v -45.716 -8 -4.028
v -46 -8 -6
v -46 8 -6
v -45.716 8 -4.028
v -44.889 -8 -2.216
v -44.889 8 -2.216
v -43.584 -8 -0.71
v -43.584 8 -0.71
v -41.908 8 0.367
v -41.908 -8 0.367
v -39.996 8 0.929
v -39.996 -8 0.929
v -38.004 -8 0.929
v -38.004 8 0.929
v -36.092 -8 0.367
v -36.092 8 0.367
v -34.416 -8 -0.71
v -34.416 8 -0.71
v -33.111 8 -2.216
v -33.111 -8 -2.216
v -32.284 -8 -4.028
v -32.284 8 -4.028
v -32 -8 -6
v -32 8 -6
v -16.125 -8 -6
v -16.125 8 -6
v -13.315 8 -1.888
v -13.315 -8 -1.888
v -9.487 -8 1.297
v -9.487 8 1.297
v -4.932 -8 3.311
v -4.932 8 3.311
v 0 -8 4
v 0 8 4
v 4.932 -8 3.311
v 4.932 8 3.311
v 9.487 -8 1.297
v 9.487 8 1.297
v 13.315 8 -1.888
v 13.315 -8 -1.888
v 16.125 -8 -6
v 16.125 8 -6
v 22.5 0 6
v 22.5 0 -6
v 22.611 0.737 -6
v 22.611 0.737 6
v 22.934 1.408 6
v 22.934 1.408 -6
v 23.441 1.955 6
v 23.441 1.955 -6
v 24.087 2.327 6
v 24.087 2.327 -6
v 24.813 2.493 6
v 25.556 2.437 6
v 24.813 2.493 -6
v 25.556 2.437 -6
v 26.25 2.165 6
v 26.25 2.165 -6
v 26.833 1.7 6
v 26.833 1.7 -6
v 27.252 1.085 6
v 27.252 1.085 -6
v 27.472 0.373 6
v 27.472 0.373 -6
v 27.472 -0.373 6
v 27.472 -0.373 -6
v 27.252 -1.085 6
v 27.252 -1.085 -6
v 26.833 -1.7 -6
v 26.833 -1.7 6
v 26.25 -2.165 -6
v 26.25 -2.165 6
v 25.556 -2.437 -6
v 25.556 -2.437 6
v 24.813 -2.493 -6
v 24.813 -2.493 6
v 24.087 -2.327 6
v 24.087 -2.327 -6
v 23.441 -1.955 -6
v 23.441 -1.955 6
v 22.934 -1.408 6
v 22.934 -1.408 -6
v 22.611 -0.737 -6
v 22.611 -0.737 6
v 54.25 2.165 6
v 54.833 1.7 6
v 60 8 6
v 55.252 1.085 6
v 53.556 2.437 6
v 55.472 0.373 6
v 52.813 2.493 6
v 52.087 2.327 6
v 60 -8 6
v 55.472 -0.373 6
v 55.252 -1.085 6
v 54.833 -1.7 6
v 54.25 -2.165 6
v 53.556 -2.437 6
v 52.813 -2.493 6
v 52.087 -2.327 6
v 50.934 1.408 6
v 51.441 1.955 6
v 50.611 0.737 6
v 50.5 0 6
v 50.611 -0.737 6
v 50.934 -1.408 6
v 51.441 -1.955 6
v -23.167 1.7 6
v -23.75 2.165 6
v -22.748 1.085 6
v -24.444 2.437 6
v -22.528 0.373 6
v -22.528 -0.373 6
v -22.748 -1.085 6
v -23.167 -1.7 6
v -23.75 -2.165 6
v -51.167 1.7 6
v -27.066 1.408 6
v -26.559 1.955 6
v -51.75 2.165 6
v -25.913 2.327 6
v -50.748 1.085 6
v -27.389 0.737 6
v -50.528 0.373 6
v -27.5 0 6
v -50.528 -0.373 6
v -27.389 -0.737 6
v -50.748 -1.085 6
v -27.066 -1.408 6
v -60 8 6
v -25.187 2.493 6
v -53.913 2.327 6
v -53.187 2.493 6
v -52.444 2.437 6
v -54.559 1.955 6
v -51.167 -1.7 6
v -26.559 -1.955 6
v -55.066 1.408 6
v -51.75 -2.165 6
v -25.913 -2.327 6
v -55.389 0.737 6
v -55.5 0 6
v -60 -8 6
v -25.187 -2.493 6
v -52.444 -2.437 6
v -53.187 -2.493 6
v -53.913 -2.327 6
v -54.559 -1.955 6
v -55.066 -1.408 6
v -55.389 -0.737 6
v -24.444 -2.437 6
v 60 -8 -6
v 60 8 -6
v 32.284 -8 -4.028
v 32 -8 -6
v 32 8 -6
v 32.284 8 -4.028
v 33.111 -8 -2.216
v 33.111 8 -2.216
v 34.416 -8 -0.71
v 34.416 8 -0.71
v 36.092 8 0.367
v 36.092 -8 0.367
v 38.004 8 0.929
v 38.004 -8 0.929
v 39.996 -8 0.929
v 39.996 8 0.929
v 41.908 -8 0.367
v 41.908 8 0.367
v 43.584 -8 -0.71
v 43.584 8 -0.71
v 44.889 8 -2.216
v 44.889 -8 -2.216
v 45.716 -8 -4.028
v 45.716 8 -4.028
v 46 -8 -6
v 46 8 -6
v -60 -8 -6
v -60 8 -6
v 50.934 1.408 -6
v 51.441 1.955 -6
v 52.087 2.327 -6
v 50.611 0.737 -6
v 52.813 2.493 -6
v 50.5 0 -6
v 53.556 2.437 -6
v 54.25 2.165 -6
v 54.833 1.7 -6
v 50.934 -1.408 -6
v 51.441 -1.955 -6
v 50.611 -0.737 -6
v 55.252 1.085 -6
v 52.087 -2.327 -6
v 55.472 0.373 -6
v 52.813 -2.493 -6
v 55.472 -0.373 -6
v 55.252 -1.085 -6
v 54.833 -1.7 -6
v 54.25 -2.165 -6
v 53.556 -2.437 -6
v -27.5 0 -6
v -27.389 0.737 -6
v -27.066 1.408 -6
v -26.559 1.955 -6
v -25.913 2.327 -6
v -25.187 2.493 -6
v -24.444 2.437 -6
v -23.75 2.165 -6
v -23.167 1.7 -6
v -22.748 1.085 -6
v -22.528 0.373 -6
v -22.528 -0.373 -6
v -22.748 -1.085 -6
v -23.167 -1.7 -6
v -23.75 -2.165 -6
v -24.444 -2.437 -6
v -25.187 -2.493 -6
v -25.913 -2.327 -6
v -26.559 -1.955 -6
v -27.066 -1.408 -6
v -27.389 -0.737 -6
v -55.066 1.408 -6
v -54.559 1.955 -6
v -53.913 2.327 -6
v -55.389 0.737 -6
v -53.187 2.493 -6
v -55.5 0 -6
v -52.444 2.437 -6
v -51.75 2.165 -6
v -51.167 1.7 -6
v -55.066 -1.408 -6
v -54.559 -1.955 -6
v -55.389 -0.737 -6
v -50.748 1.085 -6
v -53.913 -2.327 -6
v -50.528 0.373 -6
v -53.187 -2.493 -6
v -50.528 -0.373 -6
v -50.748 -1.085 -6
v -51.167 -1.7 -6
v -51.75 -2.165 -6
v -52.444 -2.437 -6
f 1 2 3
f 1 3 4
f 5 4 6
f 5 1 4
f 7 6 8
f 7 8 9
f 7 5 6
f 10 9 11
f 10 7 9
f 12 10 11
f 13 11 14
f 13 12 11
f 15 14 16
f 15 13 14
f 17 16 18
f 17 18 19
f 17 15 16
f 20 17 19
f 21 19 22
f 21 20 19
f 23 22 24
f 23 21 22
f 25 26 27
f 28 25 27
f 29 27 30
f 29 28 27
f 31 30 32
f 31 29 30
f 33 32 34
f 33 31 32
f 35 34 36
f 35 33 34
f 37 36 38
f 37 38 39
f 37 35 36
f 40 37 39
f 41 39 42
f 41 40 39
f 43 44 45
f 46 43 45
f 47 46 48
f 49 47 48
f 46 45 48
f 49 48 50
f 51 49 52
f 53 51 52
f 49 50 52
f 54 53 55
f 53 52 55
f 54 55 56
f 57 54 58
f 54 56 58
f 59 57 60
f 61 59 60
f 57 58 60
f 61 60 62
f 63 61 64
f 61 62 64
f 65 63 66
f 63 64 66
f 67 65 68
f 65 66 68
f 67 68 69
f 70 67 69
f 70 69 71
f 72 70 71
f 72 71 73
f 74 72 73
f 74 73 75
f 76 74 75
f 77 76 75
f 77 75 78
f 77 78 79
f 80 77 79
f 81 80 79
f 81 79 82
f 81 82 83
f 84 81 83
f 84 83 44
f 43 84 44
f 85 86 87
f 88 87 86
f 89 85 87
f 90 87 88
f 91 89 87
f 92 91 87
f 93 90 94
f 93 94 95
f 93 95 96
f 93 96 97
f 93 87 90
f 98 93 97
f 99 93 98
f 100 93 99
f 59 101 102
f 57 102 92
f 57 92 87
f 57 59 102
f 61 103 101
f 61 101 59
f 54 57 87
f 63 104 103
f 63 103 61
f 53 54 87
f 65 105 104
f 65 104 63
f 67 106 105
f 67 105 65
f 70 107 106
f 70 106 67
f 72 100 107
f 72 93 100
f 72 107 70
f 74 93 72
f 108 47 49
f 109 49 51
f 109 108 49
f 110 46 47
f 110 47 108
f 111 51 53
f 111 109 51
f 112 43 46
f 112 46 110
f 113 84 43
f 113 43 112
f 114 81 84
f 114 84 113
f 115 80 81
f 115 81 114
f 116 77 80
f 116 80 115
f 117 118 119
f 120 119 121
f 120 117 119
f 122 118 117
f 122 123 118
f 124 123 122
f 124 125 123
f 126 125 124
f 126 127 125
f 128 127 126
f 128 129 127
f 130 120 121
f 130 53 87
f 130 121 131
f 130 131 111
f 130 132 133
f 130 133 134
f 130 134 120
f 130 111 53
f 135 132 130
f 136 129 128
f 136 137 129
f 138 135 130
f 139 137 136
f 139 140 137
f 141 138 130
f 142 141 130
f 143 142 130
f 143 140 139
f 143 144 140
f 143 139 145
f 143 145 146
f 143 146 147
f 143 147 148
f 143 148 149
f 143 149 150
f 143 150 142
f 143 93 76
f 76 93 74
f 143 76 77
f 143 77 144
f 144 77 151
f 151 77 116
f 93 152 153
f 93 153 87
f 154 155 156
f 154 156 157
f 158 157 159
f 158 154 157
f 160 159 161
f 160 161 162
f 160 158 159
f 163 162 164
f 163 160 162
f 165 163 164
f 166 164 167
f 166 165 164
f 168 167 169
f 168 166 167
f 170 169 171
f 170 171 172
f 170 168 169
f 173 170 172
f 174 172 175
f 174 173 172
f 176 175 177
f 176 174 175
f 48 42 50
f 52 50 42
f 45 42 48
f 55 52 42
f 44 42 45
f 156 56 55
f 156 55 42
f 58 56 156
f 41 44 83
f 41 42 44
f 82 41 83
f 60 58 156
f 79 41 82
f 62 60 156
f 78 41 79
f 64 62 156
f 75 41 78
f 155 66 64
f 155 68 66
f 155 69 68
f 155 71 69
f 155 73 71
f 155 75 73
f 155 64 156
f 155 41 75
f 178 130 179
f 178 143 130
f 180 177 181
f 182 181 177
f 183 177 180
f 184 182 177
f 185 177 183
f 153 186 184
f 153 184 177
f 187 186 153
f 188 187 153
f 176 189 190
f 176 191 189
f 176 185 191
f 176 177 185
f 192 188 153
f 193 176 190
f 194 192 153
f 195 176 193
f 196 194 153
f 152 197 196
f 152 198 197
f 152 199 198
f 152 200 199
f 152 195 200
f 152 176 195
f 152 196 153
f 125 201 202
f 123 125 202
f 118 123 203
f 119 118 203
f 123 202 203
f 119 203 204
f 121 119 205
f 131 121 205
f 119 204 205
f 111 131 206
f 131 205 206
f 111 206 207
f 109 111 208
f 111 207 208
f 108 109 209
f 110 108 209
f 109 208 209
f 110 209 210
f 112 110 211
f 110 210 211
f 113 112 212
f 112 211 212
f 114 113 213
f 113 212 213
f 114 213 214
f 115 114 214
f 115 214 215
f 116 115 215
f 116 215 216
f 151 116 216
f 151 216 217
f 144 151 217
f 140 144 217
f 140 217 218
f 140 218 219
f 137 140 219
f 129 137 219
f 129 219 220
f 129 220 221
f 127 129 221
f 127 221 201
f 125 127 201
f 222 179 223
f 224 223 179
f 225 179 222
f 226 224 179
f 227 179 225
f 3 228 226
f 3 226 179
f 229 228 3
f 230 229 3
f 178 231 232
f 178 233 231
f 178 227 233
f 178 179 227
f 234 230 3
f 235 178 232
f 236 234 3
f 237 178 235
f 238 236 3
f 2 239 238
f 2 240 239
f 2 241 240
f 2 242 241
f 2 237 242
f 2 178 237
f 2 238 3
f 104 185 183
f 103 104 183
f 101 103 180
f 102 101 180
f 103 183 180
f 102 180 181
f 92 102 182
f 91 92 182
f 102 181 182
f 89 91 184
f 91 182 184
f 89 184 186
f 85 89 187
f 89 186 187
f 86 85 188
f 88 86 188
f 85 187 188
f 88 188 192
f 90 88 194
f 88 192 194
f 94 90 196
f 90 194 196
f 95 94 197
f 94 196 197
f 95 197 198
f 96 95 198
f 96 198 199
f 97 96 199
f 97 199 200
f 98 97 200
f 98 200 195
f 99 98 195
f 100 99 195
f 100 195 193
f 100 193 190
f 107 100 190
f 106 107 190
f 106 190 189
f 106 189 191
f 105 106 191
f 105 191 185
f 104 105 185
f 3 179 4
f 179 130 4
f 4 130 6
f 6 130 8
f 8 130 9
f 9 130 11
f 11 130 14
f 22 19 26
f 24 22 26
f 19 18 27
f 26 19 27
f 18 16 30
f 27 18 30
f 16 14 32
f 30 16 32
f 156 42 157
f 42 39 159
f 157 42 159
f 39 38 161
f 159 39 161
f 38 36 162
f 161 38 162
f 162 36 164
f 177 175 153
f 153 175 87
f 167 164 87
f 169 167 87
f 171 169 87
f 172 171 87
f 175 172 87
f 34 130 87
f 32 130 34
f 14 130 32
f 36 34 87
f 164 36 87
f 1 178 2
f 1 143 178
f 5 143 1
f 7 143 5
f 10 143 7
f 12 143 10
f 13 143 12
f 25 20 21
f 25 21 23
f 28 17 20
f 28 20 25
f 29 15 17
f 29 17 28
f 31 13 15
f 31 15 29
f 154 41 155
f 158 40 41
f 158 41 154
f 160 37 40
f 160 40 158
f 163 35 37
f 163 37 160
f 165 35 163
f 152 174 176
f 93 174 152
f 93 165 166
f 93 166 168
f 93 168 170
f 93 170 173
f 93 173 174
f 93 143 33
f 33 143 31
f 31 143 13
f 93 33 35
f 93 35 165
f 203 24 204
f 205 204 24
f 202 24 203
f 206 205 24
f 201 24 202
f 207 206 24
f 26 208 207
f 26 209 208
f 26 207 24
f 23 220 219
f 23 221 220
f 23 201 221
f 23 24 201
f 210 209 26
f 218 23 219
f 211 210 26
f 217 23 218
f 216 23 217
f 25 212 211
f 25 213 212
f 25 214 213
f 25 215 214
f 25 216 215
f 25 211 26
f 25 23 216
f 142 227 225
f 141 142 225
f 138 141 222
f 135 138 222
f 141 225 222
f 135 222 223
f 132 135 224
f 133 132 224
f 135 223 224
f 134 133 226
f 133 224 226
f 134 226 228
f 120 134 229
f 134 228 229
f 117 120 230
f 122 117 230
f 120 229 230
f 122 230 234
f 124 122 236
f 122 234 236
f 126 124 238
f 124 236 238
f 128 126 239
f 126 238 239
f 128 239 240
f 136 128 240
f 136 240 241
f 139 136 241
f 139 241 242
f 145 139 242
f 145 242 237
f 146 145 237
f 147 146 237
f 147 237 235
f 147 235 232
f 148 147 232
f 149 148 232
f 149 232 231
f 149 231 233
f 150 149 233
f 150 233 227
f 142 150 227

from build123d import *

# Parameters (mm, degrees)
F1_DEPTH = 8
F3_D     = 5


with BuildPart() as f1:
    # F0 (on Front) → F1 (new body, symmetric)
    with BuildSketch(Plane.XZ):
        with BuildLine():
            Line((-60, -6), (-46, -6))
            ThreePointArc((-46, -6), (-39, 1), (-32, -6))
            Line((-32, -6), (-16.124515, -6))
            ThreePointArc((-16.124515, -6), (0, 4), (16.124515, -6))
            Line((16.124515, -6), (32, -6))
            ThreePointArc((32, -6), (39, 1), (46, -6))
            Line((46, -6), (60, -6))
            Line((60, -6), (60, 6))
            Line((60, 6), (-60, 6))
            Line((-60, 6), (-60, -6))
        make_face()
    extrude(amount=F1_DEPTH, both=True)

    # F3 (through all)
    with Locations(Plane.XY.offset(6)):
        with Locations((-53, 0), (-25, 0), (25, 0), (53, 0)):
            Hole(F3_D / 2)


solid = f1.part
